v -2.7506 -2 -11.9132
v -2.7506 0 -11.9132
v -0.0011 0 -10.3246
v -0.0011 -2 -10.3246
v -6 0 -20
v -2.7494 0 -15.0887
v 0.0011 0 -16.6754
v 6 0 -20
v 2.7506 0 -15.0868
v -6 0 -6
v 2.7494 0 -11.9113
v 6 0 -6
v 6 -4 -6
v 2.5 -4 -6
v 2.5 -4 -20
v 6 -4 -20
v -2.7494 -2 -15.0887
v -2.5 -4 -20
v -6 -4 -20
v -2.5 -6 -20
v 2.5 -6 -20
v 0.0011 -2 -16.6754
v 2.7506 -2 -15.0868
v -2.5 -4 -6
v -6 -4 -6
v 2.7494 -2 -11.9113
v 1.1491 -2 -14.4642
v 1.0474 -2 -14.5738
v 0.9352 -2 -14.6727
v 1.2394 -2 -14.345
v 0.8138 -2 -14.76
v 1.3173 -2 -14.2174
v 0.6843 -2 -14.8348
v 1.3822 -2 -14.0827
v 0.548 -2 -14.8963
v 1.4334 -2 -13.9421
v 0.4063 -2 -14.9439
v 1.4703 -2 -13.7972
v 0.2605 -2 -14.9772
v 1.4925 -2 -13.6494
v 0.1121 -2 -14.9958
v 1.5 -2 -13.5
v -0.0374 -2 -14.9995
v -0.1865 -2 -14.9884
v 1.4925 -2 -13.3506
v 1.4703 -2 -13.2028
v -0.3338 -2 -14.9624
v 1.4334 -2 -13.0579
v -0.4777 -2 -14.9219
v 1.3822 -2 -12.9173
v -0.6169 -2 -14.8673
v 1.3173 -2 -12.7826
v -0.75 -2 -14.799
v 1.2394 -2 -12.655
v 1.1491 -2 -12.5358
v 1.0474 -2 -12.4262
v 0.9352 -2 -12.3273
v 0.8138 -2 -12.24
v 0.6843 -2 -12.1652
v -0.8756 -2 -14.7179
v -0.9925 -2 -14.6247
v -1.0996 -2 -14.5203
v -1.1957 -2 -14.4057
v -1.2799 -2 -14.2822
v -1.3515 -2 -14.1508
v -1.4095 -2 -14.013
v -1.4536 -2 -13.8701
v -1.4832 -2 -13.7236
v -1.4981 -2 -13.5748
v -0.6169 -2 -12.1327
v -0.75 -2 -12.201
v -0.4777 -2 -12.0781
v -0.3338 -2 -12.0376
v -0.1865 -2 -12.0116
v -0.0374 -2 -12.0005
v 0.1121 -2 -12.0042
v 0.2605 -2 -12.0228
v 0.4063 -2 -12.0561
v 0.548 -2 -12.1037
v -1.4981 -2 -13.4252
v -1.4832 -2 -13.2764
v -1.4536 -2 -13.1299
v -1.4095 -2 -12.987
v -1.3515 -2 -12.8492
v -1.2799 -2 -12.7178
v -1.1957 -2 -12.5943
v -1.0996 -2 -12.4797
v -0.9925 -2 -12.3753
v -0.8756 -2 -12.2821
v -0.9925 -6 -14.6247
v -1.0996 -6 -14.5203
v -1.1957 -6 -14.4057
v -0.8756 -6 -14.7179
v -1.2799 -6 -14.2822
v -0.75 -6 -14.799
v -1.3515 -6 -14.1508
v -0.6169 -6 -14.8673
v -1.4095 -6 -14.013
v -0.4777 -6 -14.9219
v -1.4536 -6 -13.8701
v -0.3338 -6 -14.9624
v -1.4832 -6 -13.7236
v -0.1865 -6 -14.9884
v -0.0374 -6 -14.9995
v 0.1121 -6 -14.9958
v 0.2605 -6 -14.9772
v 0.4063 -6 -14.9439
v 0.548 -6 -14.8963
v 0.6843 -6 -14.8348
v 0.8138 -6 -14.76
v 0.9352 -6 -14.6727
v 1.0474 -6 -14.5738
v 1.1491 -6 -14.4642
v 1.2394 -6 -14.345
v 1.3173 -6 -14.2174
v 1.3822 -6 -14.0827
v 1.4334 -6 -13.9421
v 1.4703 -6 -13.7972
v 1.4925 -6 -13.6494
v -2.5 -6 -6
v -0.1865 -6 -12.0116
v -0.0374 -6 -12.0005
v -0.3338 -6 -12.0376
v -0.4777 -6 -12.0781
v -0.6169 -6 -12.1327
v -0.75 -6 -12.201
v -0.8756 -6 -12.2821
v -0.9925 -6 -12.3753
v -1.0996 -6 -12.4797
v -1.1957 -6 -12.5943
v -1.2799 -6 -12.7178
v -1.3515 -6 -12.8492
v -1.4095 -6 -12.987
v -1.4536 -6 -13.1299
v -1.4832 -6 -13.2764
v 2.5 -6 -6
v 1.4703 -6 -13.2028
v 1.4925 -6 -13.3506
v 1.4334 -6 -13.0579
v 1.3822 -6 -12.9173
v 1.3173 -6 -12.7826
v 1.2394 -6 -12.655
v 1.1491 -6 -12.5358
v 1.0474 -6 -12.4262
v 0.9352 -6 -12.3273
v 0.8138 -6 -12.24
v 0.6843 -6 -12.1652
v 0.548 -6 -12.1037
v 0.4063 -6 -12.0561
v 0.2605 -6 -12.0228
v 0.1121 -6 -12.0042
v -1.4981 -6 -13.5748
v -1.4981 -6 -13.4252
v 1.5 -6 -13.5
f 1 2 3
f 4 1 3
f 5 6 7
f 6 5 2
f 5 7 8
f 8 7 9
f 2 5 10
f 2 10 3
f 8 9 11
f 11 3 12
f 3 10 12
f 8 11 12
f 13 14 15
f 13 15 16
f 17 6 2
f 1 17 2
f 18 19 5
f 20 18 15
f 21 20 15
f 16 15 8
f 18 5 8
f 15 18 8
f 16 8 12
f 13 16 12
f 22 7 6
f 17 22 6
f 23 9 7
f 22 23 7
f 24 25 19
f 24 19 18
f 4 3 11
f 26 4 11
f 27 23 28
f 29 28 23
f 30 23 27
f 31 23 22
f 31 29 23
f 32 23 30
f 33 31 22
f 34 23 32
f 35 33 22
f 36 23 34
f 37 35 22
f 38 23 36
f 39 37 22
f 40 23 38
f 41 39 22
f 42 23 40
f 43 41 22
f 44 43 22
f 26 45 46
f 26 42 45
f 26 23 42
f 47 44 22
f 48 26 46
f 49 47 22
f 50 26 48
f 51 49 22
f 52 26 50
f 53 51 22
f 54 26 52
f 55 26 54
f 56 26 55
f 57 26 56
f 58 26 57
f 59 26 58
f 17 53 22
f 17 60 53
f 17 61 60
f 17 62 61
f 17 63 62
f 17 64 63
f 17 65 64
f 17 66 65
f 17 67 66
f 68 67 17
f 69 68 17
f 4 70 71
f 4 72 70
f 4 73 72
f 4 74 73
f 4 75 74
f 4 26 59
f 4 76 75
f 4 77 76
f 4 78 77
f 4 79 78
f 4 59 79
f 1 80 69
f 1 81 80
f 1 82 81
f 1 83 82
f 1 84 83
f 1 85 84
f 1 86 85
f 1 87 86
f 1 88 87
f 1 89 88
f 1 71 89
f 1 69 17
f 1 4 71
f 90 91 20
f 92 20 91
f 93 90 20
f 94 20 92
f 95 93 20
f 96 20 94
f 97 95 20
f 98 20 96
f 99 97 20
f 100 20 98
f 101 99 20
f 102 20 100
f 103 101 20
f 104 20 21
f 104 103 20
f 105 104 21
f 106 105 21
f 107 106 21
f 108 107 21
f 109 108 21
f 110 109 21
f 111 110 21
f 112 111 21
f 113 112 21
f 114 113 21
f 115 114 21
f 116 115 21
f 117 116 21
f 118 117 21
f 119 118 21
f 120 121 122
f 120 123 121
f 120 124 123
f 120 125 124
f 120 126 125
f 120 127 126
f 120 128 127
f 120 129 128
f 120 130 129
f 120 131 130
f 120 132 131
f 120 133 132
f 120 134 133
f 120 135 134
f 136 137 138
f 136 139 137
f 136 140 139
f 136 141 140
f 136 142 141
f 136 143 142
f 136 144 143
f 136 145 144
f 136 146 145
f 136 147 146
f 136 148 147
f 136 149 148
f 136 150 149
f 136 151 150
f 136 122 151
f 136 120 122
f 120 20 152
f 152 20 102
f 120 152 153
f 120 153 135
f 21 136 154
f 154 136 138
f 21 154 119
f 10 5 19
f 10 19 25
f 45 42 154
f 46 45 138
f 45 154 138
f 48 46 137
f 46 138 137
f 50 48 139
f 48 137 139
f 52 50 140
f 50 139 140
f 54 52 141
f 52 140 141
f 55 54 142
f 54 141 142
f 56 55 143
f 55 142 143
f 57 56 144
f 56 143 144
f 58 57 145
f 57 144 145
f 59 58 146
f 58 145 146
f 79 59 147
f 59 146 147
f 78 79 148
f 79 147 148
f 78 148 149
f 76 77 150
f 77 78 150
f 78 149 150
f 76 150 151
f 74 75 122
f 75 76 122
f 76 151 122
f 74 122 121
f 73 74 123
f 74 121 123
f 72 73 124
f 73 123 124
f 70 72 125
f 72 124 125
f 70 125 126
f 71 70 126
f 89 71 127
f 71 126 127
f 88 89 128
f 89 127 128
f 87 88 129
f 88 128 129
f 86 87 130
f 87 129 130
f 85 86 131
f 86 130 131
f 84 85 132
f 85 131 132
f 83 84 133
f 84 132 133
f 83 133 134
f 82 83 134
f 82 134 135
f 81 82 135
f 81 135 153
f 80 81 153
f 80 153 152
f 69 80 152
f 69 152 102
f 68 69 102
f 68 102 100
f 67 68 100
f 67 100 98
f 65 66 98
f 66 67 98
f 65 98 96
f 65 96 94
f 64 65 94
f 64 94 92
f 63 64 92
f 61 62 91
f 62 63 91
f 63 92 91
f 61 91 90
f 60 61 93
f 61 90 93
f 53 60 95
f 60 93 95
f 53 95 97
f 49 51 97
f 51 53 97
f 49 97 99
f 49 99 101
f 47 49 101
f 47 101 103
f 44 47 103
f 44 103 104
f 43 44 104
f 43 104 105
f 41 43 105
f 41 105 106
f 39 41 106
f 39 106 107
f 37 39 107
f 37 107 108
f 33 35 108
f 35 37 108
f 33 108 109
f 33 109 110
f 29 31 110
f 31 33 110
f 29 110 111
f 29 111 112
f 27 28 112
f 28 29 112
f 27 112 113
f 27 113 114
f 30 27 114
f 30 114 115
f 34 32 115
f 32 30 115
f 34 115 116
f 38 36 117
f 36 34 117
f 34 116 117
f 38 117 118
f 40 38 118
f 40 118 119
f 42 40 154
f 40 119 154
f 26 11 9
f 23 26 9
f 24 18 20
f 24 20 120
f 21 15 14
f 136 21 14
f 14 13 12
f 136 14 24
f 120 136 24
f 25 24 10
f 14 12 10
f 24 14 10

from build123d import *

# Parameters (mm, degrees)
F0_W     = 12
F0_H     = 40
F1_DEPTH = 4
F2_W     = 5
F2_H     = 40
F3_DEPTH = 2
F4_R     = 1.5
F5_DEPTH = 25
F6_R     = 1.5
F7_DEPTH = 2
F8_W     = 4.029665
F8_H     = 26
F8_W_2   = 12
F9_DEPTH = 25


with BuildPart() as f1:
    # F0 (on Front) → F1 (new body)
    with BuildSketch(Plane.XZ):
        Rectangle(F0_W, F0_H)
    extrude(amount=F1_DEPTH)

    # F2 (on face) → F3 (join)
    with BuildSketch(Plane.XZ.offset(4)):
        Rectangle(F2_W, F2_H)
    extrude(amount=F3_DEPTH)

    # F4 (on face) → F5 (cut)
    with BuildSketch(Plane.XZ.offset(6)):
        with Locations((0, 16.5)):
            Circle(F4_R)
        with Locations((0, -13.5)):
            Circle(F4_R)
    extrude(amount=-F5_DEPTH, mode=Mode.SUBTRACT)

    # F6 (on face) → F7 (cut)
    with BuildSketch(Plane(origin=(0, 0, 0), x_dir=(-1, 0, 0), z_dir=(0, 1, 0))):
        Polygon((2.75, 14.912287), (2.75, 18.087713), (0, 19.675426), (-2.75, 18.087713), (-2.75, 14.912287), (0, 13.324574), align=None)
        with Locations((0, 16.5)):
            Circle(F6_R, mode=Mode.SUBTRACT)
        Polygon((2.750551, -11.913241), (0.001102, -10.324574), (-2.749449, -11.911332), (-2.750551, -15.086759), (-0.001102, -16.675426), (2.749449, -15.088668), align=None)
        with Locations((0, -13.5)):
            Circle(F6_R, mode=Mode.SUBTRACT)
    extrude(amount=-F7_DEPTH, mode=Mode.SUBTRACT)

    # F8 (on face) → F9 (cut)
    with BuildSketch(Plane(origin=(0, 0, 0), x_dir=(-1, 0, 0), z_dir=(0, 1, 0))):
        with Locations((8.014833, 7)):
            Rectangle(F8_W, F8_H)
        with Locations((0, 7)):
            Rectangle(F8_W_2, F8_H)
        Polygon((2.75, 18.087713), (2.75, 14.912287), (0, 13.324574), (-2.75, 14.912287), (-2.75, 18.087713), (0, 19.675426), align=None, mode=Mode.SUBTRACT)
        Polygon((0, 13.324574), (2.75, 14.912287), (2.75, 18.087713), (0, 19.675426), (-2.75, 18.087713), (-2.75, 14.912287), align=None)
    extrude(amount=-F9_DEPTH, mode=Mode.SUBTRACT)


solid = f1.part
